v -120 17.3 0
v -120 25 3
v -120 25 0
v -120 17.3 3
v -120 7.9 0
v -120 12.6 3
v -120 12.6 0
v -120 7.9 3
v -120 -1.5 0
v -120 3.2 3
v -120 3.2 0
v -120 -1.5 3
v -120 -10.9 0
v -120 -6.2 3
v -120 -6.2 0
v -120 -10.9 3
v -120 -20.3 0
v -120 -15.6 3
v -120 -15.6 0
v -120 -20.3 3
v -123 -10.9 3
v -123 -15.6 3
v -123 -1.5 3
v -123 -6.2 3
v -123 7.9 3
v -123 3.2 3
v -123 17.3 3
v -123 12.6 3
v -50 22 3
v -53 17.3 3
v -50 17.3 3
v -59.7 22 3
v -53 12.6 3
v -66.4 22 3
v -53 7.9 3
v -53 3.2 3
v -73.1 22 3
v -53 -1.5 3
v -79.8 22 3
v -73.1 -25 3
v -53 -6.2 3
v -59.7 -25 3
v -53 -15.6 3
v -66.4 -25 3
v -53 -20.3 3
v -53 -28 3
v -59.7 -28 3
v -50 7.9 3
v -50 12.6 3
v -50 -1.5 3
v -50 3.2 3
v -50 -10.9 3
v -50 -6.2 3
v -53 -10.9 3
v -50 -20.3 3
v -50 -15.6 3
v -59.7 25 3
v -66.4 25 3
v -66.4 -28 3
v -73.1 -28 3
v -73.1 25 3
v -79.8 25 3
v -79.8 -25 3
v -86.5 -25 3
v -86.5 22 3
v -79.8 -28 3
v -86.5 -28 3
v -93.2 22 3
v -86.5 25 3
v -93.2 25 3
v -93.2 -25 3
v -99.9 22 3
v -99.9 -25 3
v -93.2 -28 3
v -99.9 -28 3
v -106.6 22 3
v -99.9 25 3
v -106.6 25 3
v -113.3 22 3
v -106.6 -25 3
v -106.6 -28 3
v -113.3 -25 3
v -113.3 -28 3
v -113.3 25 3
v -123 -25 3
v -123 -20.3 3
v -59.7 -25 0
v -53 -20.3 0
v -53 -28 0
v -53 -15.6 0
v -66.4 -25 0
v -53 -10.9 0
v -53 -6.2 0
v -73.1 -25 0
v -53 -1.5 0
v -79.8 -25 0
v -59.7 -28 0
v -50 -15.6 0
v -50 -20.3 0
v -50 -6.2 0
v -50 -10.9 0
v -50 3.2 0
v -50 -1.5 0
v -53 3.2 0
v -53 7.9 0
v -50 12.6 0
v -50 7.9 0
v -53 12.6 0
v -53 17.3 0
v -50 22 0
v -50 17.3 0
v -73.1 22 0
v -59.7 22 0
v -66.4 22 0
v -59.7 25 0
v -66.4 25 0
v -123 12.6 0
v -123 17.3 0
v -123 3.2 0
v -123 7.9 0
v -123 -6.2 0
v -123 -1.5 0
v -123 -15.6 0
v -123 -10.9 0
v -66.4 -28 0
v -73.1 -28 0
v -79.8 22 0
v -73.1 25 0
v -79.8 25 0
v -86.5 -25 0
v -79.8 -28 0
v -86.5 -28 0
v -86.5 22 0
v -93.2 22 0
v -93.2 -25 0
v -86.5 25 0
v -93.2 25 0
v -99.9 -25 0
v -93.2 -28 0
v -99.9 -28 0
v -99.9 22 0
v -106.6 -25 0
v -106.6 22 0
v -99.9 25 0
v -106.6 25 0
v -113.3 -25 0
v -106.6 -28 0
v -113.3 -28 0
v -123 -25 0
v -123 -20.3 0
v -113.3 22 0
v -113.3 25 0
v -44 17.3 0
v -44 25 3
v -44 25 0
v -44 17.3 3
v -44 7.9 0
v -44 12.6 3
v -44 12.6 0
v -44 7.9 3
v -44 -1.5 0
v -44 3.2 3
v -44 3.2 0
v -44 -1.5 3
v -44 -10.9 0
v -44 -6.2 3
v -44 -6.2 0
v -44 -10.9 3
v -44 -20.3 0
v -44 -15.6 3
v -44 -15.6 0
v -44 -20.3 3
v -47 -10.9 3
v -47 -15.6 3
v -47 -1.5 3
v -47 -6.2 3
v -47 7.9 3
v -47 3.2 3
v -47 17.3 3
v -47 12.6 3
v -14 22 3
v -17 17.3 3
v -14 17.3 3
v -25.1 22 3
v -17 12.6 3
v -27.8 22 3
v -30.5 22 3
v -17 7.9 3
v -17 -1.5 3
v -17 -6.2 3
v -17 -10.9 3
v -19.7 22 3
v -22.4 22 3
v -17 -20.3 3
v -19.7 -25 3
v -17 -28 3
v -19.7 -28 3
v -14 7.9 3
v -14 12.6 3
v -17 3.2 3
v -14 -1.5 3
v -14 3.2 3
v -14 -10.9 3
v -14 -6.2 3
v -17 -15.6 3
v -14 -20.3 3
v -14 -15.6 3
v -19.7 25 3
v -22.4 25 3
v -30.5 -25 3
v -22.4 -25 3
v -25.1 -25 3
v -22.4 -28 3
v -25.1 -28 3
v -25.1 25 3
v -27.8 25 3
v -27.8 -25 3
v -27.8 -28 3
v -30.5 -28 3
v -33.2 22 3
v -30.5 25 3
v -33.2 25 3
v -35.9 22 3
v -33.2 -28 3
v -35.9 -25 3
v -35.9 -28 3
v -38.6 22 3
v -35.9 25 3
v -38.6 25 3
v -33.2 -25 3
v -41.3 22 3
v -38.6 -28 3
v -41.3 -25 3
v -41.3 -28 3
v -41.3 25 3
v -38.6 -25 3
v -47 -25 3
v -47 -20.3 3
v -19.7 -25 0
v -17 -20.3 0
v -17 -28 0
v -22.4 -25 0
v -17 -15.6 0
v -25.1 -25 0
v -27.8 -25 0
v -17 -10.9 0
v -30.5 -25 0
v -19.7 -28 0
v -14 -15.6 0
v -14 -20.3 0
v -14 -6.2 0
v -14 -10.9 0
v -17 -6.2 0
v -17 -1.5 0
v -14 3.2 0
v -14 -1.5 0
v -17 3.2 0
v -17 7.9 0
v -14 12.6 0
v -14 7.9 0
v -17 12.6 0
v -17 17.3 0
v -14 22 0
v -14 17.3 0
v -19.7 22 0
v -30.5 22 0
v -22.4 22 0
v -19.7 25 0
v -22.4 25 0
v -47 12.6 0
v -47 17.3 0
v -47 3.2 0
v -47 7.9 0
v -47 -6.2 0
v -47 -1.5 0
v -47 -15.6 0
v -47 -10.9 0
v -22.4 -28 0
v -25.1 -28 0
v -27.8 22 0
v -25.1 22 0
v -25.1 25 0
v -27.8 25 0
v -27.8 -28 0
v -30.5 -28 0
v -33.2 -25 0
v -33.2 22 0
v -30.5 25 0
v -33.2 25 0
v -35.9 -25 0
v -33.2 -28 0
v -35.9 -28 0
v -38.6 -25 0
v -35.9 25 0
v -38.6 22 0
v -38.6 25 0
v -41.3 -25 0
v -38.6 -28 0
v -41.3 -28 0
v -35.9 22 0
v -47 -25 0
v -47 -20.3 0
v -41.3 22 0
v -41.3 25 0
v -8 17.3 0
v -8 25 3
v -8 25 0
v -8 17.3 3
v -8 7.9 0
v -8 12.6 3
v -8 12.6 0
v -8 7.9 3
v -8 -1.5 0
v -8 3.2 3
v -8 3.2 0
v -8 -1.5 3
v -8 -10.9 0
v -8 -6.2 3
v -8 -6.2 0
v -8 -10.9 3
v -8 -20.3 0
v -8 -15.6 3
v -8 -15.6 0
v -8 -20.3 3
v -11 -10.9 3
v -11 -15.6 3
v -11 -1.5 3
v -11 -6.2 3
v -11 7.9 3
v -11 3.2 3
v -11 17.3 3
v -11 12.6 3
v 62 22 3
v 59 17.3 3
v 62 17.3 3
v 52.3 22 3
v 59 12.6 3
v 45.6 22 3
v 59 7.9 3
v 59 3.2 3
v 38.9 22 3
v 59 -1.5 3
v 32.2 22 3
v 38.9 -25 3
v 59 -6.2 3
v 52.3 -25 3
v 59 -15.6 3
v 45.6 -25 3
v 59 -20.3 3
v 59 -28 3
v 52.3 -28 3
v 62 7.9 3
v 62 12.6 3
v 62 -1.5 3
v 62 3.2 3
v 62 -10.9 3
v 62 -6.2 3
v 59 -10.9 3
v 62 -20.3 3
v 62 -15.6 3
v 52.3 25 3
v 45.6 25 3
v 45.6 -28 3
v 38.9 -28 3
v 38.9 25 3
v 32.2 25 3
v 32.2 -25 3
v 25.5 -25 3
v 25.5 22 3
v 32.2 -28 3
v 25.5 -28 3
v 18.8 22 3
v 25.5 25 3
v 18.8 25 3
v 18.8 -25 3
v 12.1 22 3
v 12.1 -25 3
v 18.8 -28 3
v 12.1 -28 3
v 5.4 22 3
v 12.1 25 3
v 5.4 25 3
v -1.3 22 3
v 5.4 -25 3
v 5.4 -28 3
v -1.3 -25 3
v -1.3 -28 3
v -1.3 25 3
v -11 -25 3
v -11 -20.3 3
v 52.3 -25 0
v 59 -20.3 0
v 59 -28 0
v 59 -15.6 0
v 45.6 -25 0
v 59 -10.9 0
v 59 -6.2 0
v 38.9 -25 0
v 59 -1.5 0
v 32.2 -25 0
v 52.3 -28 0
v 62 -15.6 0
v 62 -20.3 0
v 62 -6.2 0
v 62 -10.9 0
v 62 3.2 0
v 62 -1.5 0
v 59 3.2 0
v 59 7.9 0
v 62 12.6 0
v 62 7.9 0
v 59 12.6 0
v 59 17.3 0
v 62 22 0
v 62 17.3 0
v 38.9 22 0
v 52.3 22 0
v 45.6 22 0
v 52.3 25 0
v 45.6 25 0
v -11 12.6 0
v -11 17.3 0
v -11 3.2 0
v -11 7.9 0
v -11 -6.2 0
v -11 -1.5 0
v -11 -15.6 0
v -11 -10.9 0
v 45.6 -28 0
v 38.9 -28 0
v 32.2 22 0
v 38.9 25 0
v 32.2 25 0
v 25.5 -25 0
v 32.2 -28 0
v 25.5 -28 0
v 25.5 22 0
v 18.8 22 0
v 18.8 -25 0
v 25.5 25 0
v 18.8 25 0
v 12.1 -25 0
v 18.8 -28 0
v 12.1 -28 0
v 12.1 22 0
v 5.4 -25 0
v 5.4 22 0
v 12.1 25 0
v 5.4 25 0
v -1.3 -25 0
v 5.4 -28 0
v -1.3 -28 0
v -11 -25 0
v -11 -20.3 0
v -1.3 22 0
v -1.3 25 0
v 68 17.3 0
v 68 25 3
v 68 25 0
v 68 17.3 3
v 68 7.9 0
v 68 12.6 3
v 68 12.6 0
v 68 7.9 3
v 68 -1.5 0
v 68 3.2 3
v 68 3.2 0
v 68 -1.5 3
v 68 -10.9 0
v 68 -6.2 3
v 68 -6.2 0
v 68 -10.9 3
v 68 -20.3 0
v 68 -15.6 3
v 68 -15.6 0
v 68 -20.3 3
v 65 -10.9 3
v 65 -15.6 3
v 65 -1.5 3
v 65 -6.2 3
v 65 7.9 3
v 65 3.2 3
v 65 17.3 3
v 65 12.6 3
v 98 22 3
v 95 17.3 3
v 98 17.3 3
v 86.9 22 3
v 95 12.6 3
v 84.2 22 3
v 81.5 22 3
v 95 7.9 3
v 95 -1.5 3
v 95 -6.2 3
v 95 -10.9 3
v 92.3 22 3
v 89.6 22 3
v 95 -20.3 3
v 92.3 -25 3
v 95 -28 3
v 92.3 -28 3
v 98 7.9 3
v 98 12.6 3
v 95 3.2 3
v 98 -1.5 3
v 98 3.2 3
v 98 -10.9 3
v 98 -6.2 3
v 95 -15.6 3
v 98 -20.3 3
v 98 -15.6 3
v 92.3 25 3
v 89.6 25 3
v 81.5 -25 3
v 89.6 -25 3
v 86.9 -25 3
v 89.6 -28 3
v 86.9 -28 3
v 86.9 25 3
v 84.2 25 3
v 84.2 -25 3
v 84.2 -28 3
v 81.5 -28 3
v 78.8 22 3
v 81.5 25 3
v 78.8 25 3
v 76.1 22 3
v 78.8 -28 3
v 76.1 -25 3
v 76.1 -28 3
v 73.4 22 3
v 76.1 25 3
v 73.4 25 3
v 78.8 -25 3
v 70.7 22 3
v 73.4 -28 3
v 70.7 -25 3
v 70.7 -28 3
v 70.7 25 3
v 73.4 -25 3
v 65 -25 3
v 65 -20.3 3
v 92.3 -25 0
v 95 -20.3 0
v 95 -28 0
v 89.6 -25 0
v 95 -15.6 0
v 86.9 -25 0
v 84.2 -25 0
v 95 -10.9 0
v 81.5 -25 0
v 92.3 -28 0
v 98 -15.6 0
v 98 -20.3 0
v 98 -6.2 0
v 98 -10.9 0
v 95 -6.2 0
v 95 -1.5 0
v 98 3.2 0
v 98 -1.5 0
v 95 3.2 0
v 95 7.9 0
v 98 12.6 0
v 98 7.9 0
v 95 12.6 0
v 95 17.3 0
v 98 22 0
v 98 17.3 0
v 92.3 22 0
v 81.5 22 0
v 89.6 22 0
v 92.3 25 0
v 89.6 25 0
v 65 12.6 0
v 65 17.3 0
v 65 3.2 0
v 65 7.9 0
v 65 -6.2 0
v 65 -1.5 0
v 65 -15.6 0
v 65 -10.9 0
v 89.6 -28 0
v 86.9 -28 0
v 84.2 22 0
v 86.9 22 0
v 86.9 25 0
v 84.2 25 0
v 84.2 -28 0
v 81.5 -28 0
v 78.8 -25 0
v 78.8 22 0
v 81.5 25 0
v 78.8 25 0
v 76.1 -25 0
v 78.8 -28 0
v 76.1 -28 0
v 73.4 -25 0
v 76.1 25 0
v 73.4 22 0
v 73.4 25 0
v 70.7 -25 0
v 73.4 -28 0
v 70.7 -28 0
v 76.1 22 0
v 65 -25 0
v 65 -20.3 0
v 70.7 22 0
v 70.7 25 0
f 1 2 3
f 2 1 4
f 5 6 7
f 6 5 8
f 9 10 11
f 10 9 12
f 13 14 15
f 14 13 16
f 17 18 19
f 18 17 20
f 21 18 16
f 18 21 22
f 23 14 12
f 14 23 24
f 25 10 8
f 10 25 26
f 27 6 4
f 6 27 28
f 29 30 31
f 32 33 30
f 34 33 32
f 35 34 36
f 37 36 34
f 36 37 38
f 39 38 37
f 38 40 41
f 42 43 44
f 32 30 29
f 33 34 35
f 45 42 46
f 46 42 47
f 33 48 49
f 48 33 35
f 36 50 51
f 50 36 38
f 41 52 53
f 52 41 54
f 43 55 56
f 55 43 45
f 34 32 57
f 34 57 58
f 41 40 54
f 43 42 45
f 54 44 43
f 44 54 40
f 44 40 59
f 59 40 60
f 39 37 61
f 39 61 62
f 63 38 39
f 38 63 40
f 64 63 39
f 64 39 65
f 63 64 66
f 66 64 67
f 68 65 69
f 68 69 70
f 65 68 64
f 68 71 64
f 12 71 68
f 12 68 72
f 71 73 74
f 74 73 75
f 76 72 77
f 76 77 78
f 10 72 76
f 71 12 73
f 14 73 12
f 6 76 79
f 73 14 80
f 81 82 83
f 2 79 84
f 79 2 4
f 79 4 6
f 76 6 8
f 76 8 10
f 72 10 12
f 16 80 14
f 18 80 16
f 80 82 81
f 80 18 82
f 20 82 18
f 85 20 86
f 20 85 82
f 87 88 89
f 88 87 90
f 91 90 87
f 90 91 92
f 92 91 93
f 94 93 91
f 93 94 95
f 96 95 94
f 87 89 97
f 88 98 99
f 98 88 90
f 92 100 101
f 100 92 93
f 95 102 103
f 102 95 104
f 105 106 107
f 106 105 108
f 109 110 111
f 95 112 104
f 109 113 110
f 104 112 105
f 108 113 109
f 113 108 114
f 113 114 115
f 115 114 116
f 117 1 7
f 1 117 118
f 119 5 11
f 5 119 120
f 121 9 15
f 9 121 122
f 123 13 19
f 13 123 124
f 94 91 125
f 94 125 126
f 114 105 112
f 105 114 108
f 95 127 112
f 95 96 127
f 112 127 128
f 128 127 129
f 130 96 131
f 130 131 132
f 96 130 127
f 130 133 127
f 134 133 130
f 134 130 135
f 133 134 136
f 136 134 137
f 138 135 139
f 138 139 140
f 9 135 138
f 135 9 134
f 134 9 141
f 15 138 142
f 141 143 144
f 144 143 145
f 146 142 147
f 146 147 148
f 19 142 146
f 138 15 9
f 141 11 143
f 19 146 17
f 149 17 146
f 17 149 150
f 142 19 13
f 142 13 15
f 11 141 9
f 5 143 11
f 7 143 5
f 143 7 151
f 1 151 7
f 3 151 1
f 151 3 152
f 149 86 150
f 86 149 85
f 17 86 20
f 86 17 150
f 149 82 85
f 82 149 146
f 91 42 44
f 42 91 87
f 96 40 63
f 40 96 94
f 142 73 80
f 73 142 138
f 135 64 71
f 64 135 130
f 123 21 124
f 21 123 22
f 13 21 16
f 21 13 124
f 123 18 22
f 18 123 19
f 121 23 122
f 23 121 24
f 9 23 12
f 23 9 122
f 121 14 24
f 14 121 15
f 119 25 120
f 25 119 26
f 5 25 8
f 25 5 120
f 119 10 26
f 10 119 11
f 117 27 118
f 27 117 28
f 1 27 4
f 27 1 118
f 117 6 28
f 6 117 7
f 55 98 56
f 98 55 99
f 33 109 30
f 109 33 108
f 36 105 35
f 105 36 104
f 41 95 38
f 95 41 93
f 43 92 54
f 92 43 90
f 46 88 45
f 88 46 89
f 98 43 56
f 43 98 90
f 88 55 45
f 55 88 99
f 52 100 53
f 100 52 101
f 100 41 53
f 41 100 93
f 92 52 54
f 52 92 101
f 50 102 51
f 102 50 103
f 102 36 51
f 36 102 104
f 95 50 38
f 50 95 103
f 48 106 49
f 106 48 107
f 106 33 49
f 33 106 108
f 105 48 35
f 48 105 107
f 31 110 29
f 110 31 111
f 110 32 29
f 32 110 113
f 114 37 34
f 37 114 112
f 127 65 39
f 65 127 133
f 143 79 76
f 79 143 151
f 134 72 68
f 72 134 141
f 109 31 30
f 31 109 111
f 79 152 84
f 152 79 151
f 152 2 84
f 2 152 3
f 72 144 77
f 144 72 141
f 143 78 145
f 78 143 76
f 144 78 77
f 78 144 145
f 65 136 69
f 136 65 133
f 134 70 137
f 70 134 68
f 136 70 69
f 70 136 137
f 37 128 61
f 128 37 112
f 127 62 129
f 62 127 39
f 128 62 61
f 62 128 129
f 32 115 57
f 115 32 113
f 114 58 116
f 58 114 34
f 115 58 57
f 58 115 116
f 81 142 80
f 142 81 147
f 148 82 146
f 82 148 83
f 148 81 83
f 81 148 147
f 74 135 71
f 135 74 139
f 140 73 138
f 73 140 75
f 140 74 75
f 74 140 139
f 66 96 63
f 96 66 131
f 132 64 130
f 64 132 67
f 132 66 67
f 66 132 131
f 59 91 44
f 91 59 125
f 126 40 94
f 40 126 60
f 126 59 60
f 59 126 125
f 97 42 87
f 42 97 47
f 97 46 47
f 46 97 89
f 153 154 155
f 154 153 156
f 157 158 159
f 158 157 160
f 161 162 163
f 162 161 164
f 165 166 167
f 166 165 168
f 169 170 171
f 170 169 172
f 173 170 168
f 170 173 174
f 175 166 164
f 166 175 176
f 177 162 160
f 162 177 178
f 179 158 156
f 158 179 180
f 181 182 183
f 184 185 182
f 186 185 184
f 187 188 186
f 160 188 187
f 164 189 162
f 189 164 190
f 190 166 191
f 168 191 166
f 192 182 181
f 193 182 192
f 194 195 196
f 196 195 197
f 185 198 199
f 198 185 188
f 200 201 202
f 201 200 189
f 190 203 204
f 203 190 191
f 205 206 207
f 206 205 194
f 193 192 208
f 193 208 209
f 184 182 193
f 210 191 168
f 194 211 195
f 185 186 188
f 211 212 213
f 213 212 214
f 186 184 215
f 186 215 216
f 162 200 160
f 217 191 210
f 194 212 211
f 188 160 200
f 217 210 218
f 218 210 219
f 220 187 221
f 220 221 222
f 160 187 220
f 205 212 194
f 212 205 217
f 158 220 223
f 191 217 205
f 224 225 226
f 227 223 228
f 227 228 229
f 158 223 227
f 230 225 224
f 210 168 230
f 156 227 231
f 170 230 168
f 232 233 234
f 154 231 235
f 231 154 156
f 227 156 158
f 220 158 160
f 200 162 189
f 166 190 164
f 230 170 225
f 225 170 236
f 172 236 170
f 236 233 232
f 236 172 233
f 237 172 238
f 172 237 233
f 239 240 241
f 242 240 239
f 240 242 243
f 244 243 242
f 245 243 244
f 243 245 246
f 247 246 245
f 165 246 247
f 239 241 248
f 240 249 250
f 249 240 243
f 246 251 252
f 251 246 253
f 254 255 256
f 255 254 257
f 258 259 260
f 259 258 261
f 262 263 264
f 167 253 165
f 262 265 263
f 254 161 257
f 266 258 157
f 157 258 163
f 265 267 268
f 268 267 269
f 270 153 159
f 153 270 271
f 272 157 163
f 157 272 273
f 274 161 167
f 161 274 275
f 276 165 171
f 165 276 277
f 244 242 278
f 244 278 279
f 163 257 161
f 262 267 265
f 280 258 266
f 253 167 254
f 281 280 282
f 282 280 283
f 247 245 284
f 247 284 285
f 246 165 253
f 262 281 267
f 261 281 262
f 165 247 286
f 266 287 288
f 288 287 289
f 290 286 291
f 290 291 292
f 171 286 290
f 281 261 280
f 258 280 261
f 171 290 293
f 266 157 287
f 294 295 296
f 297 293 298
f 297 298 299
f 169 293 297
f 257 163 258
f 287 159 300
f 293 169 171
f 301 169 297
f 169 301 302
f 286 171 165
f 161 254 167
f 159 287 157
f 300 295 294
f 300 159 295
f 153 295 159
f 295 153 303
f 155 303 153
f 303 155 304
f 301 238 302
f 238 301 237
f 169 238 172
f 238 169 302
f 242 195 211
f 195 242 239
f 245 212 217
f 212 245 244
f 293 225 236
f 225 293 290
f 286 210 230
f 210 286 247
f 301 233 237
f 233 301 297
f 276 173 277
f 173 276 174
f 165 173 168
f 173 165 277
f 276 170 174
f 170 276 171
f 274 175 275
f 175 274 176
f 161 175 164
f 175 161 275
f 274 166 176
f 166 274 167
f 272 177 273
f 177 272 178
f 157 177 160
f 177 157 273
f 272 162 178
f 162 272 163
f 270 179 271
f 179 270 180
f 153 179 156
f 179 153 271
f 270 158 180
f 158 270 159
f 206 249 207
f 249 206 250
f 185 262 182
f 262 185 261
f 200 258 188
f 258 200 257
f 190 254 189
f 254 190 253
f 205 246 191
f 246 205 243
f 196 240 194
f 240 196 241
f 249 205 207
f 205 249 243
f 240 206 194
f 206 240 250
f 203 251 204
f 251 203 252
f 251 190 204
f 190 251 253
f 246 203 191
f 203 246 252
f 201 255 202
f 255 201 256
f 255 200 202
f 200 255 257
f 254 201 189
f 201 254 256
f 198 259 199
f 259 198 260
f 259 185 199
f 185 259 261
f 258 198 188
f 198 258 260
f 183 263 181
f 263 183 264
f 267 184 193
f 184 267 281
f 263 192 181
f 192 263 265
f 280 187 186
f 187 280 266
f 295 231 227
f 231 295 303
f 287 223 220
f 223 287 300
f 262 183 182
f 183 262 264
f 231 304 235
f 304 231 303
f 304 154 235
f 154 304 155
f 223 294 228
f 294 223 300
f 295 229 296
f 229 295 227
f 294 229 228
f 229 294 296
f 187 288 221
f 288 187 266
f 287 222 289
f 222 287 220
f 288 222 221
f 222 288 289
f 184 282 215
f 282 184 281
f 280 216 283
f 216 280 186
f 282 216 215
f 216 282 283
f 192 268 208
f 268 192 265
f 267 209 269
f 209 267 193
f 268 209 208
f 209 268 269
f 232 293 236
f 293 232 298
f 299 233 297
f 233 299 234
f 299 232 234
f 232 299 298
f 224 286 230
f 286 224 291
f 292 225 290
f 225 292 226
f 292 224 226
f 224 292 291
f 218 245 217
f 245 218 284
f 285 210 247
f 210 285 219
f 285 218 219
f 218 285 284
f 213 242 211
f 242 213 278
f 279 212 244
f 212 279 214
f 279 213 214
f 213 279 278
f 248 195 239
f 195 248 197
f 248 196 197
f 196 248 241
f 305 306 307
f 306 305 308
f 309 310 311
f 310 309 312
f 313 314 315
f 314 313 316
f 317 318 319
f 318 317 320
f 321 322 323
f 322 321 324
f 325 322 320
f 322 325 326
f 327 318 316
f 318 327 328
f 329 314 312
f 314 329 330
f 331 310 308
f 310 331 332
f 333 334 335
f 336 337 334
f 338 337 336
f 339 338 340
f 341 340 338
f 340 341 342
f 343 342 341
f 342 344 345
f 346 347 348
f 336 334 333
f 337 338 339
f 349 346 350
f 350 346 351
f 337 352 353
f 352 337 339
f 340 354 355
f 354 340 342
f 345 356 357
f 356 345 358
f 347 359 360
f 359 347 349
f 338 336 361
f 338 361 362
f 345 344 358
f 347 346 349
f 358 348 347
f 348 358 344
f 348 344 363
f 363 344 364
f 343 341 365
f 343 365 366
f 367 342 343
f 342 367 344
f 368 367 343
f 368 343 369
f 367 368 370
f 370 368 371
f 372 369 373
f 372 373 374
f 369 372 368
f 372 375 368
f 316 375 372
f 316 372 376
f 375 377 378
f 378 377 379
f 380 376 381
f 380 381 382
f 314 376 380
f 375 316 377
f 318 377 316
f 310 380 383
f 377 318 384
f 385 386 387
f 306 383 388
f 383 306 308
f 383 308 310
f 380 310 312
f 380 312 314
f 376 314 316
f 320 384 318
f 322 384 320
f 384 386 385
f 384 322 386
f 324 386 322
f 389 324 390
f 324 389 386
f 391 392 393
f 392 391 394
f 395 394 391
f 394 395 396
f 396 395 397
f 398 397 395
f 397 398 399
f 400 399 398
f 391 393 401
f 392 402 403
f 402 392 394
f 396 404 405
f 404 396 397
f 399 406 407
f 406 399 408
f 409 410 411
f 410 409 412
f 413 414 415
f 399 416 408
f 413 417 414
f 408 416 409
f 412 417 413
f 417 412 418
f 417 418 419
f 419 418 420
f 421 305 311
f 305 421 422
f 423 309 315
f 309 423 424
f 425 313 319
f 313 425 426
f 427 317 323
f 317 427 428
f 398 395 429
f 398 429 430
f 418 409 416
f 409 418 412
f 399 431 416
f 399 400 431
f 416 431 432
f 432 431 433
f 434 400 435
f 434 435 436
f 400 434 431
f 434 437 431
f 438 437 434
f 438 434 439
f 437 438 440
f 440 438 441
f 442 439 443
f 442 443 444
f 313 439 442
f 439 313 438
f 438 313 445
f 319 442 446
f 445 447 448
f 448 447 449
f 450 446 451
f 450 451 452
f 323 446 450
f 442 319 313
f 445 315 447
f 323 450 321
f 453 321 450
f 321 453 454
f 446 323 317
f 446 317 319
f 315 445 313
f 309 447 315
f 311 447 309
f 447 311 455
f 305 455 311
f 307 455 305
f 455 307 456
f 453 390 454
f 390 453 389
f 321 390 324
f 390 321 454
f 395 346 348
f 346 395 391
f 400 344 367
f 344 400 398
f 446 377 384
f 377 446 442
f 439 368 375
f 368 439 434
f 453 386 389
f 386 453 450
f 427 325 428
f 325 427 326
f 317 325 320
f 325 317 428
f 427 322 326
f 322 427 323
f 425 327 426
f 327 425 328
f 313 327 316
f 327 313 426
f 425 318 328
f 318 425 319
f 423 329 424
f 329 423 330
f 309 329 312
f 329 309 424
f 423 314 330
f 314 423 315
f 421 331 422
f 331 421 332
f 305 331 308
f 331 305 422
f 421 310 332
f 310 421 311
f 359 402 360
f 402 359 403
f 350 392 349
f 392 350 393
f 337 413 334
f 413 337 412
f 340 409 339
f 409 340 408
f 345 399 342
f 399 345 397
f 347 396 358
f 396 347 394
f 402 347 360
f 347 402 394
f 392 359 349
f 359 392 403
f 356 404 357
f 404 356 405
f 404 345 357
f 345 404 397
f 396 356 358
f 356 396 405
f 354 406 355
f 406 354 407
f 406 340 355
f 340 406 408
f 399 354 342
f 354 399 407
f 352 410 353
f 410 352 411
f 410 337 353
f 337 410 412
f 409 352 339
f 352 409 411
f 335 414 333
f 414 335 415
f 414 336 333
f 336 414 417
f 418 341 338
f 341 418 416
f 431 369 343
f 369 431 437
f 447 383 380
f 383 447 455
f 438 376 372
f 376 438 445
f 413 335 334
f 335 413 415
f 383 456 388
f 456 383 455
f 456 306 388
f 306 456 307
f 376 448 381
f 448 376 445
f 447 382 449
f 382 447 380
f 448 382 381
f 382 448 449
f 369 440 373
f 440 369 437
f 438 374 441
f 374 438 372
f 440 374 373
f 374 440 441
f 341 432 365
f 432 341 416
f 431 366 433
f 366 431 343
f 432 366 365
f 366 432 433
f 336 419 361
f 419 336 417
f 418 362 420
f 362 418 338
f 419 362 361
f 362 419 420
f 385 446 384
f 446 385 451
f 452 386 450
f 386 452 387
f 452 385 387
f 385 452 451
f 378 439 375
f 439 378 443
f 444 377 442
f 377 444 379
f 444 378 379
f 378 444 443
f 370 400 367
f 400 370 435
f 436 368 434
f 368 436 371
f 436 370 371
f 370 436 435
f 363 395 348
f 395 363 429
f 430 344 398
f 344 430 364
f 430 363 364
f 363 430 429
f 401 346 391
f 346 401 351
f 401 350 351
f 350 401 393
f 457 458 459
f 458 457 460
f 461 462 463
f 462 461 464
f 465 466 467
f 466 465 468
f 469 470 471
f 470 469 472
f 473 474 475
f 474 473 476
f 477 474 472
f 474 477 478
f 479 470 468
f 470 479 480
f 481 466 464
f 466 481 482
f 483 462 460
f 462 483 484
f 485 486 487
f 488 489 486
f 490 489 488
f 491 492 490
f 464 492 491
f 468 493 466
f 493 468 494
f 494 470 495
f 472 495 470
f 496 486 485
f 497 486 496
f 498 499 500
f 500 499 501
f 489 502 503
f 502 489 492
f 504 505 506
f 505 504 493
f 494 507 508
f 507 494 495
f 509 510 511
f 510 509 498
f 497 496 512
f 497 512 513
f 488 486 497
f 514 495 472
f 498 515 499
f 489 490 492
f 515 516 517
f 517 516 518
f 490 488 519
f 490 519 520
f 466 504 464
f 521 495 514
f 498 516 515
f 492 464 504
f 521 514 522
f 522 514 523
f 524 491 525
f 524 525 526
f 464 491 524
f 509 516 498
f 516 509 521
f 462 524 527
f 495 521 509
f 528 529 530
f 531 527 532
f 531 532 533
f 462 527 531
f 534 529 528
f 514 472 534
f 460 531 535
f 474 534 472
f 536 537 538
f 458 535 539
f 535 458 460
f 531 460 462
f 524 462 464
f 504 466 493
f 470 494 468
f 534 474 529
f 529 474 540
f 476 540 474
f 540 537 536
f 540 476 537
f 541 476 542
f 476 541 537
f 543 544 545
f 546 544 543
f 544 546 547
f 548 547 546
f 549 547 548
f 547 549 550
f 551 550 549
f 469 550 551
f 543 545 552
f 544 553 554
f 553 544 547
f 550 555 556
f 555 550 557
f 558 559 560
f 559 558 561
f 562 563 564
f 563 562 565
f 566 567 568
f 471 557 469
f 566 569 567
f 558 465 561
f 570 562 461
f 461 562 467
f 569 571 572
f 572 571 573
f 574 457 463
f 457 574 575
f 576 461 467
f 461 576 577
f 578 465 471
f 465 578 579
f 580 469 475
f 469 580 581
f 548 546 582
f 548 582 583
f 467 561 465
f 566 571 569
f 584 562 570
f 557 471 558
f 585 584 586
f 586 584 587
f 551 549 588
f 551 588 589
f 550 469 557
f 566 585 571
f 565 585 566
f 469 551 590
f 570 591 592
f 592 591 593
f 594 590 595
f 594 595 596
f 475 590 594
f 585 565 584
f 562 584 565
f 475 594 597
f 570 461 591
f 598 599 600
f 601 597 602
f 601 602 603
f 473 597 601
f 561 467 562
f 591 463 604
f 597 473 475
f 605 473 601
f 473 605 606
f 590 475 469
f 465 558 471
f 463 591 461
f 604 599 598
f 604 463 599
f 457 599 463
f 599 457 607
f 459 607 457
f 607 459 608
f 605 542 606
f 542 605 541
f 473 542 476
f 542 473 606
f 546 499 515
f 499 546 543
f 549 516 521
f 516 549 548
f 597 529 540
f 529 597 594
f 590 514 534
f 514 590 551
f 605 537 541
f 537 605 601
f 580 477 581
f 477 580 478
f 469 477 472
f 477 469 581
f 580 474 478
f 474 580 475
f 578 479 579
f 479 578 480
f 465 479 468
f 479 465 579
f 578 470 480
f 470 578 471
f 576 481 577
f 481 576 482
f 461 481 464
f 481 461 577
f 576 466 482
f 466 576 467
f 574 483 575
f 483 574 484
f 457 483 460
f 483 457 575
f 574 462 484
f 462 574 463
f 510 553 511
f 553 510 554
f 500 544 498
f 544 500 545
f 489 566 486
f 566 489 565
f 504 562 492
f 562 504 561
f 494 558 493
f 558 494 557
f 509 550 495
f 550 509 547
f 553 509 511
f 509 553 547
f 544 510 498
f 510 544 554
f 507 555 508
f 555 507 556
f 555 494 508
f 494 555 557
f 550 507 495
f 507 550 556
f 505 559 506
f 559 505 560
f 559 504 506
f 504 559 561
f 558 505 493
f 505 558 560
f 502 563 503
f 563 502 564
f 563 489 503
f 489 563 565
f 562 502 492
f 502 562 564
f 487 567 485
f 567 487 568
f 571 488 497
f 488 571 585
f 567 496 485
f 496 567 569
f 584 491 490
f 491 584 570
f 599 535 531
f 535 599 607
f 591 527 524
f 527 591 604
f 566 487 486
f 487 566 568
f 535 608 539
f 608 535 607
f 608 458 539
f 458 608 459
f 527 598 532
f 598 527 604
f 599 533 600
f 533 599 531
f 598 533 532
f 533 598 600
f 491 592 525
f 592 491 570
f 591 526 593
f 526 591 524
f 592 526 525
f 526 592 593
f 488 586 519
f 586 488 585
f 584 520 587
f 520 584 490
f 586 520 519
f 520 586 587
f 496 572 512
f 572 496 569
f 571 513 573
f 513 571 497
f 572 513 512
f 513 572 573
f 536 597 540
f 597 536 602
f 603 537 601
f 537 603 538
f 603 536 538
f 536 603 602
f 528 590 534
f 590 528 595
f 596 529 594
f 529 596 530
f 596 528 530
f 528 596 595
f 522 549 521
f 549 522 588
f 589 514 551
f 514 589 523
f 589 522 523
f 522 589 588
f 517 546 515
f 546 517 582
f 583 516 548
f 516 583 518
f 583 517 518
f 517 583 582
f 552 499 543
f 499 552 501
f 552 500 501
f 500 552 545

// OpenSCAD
outer_width = 70; // mm
outer_depth = 50; // mm
outer_height = 30; // mm
wall_thickness = 3; // mm
inner_width = outer_width - wall_thickness; // mm
inner_depth = outer_depth - wall_thickness; // mm
inner_height = outer_height - wall_thickness; // mm
n_teeth = 10;
x_teeth_length = inner_width / n_teeth;
y_teeth_length = inner_depth / n_teeth;
z_teeth_length = inner_height/ n_teeth;
spacing = wall_thickness; // Spacing between the parts

part_1_x = -outer_width - outer_depth;
part_1_y = -outer_depth / 2;

part_2_x = part_1_x + outer_width + wall_thickness + spacing;;
part_2_y = part_1_y;

part_3_x = part_2_x + outer_height + wall_thickness + spacing;
part_3_y = part_2_y;

part_4_x = part_3_x + outer_width + wall_thickness + spacing;
part_4_y = part_3_y;

//     +-+
//     |5|
// +-+-+-+-+
// |1|2|3|4|
// +-+-+-+-+
//     |6|
//     +-+
//
// 3 is base, width x depth

//---------------------------------------
// PART 1
//---------------------------------------
//                 5
//
//        +--+  +--+  +--+
//        |  |  |  |  |  |
//        +..+--+..+--+..+--+--+
//        |                 .  |
//     +--+                 +--+
// 4   |  .                 |      2
//     +--+        1        +--+
//        |                 .  |
//     +--+                 +--+
//     |  .                 |
//     +--+--+..+--+..+--+..+
//           |  |  |  |  |  |
//           +--+  +--+  +--+
//
//                6

translate([part_1_x, part_1_y, 0])
  cube([inner_width,inner_depth,wall_thickness]);

// Left teeth, between 4 and 1
for (i = [0:n_teeth/2-1])
  translate([part_1_x, part_1_y, 0])
    translate([-wall_thickness, i * y_teeth_length  * 2,0])
      cube([wall_thickness,y_teeth_length,wall_thickness]);
// Right teeth, between 1 and 2
for (i = [0:n_teeth/2-1])
  translate([part_1_x, part_1_y, 0])
    translate([inner_width, y_teeth_length + (i * y_teeth_length  * 2),0])
      cube([wall_thickness,y_teeth_length,wall_thickness]);

// Top, between 5 and 1
for (i = [0:n_teeth/2-1])
  translate([part_1_x, part_1_y, 0])
    translate([0 + (i * x_teeth_length  * 2), inner_depth,0])
      cube([x_teeth_length, wall_thickness,wall_thickness]);
// Bottom teeth, between 1 and 6 
for (i = [0:n_teeth/2-1])
  translate([part_1_x, part_1_y, 0])
    translate([x_teeth_length + (i * x_teeth_length  * 2), -wall_thickness,0])
      cube([x_teeth_length, wall_thickness,wall_thickness]);


//---------------------------------------
// PART 2
//---------------------------------------
//                 5
//
//        +--+  +--+  +--+
//        |  |  |  |  |  |
//        +..+--+..+--+..+--+--+
//        |                 .  |
//     +--+                 +--+
// 1   |  .                 |      3
//     +--+        2        +--+
//        |                 .  |
//     +--+                 +--+
//     |  .                 |
//     +--+--+..+--+..+--+..+
//           |  |  |  |  |  |
//           +--+  +--+  +--+
//
//                6

translate([part_2_x, part_2_y, 0])
  cube([inner_height,inner_depth,wall_thickness]);

for (i = [0:n_teeth/2-1])
  translate([part_2_x, part_2_y, 0])
    translate([-wall_thickness, i * y_teeth_length  * 2,0])
      cube([wall_thickness,y_teeth_length,wall_thickness]);
for (i = [0:n_teeth/2-1])
  translate([part_2_x, part_2_y, 0])
    translate([inner_height, y_teeth_length + (i * y_teeth_length  * 2),0])
      cube([wall_thickness,y_teeth_length,wall_thickness]);

// Top, between 5 and 2
for (i = [0:n_teeth/2-1])
  translate([part_2_x, part_2_y, 0])
    translate([0 + (i * z_teeth_length  * 2), inner_depth, 0])
      cube([z_teeth_length, wall_thickness,wall_thickness]);
// Bottom teeth, between 2 and 6 
for (i = [0:n_teeth/2-1])
  translate([part_2_x, part_2_y, 0])
    translate([z_teeth_length + (i * z_teeth_length  * 2), -wall_thickness,0])
      cube([z_teeth_length, wall_thickness,wall_thickness]);

//---------------------------------------
// PART 3
//---------------------------------------
//                 5
//
//        +--+  +--+  +--+
//        |  |  |  |  |  |
//        +..+--+..+--+..+--+--+
//        |                 .  |
//     +--+                 +--+
// 2   |  .                 |      4
//     +--+        3        +--+
//        |                 .  |
//     +--+                 +--+
//     |  .                 |
//     +--+--+..+--+..+--+..+
//           |  |  |  |  |  |
//           +--+  +--+  +--+
//
//                6

translate([part_3_x, part_3_y, 0])
  cube([inner_width,inner_depth,wall_thickness]);

for (i = [0:n_teeth/2-1])
  translate([part_3_x, part_3_y, 0])
    translate([-wall_thickness, i * y_teeth_length  * 2,0])
      cube([wall_thickness,y_teeth_length,wall_thickness]);
for (i = [0:n_teeth/2-1])
  translate([part_3_x, part_3_y, 0])
    translate([inner_width, y_teeth_length + (i * y_teeth_length  * 2),0])
      cube([wall_thickness,y_teeth_length,wall_thickness]);

// Top, between 5 and 3
for (i = [0:n_teeth/2-1])
  translate([part_3_x, part_3_y, 0])
    translate([0 + (i * x_teeth_length  * 2), inner_depth,0])
      cube([x_teeth_length, wall_thickness,wall_thickness]);
// Bottom teeth, between 3 and 6 
for (i = [0:n_teeth/2-1])
  translate([part_3_x, part_3_y, 0])
    translate([x_teeth_length + (i * x_teeth_length  * 2), -wall_thickness,0])
      cube([x_teeth_length, wall_thickness,wall_thickness]);

//---------------------------------------
// PART 4
//---------------------------------------
//                 5
//
//        +--+  +--+  +--+
//        |  |  |  |  |  |
//        +..+--+..+--+..+--+--+
//        |                 .  |
//     +--+                 +--+
// 3   |  .                 |      1
//     +--+        4        +--+
//        |                 .  |
//     +--+                 +--+
//     |  .                 |
//     +--+--+..+--+..+--+..+
//           |  |  |  |  |  |
//           +--+  +--+  +--+
//
//                6

translate([part_4_x, part_4_y, 0])
  cube([inner_height,inner_depth,wall_thickness]);

for (i = [0:n_teeth/2-1])
  translate([part_4_x, part_4_y, 0])
    translate([-wall_thickness, i * y_teeth_length  * 2,0])
      cube([wall_thickness,y_teeth_length,wall_thickness]);
for (i = [0:n_teeth/2-1])
  translate([part_4_x, part_4_y, 0])
    translate([inner_height, y_teeth_length + (i * y_teeth_length  * 2),0])
      cube([wall_thickness,y_teeth_length,wall_thickness]);

// Top, between 5 and 4
for (i = [0:n_teeth/2-1])
  translate([part_4_x, part_4_y, 0])
    translate([0 + (i * z_teeth_length  * 2), inner_depth, 0])
      cube([z_teeth_length, wall_thickness,wall_thickness]);
// Bottom teeth, between 4 and 6 
for (i = [0:n_teeth/2-1])
  translate([part_4_x, part_4_y, 0])
    translate([z_teeth_length + (i * z_teeth_length  * 2), -wall_thickness,0])
      cube([z_teeth_length, wall_thickness,wall_thickness]);
